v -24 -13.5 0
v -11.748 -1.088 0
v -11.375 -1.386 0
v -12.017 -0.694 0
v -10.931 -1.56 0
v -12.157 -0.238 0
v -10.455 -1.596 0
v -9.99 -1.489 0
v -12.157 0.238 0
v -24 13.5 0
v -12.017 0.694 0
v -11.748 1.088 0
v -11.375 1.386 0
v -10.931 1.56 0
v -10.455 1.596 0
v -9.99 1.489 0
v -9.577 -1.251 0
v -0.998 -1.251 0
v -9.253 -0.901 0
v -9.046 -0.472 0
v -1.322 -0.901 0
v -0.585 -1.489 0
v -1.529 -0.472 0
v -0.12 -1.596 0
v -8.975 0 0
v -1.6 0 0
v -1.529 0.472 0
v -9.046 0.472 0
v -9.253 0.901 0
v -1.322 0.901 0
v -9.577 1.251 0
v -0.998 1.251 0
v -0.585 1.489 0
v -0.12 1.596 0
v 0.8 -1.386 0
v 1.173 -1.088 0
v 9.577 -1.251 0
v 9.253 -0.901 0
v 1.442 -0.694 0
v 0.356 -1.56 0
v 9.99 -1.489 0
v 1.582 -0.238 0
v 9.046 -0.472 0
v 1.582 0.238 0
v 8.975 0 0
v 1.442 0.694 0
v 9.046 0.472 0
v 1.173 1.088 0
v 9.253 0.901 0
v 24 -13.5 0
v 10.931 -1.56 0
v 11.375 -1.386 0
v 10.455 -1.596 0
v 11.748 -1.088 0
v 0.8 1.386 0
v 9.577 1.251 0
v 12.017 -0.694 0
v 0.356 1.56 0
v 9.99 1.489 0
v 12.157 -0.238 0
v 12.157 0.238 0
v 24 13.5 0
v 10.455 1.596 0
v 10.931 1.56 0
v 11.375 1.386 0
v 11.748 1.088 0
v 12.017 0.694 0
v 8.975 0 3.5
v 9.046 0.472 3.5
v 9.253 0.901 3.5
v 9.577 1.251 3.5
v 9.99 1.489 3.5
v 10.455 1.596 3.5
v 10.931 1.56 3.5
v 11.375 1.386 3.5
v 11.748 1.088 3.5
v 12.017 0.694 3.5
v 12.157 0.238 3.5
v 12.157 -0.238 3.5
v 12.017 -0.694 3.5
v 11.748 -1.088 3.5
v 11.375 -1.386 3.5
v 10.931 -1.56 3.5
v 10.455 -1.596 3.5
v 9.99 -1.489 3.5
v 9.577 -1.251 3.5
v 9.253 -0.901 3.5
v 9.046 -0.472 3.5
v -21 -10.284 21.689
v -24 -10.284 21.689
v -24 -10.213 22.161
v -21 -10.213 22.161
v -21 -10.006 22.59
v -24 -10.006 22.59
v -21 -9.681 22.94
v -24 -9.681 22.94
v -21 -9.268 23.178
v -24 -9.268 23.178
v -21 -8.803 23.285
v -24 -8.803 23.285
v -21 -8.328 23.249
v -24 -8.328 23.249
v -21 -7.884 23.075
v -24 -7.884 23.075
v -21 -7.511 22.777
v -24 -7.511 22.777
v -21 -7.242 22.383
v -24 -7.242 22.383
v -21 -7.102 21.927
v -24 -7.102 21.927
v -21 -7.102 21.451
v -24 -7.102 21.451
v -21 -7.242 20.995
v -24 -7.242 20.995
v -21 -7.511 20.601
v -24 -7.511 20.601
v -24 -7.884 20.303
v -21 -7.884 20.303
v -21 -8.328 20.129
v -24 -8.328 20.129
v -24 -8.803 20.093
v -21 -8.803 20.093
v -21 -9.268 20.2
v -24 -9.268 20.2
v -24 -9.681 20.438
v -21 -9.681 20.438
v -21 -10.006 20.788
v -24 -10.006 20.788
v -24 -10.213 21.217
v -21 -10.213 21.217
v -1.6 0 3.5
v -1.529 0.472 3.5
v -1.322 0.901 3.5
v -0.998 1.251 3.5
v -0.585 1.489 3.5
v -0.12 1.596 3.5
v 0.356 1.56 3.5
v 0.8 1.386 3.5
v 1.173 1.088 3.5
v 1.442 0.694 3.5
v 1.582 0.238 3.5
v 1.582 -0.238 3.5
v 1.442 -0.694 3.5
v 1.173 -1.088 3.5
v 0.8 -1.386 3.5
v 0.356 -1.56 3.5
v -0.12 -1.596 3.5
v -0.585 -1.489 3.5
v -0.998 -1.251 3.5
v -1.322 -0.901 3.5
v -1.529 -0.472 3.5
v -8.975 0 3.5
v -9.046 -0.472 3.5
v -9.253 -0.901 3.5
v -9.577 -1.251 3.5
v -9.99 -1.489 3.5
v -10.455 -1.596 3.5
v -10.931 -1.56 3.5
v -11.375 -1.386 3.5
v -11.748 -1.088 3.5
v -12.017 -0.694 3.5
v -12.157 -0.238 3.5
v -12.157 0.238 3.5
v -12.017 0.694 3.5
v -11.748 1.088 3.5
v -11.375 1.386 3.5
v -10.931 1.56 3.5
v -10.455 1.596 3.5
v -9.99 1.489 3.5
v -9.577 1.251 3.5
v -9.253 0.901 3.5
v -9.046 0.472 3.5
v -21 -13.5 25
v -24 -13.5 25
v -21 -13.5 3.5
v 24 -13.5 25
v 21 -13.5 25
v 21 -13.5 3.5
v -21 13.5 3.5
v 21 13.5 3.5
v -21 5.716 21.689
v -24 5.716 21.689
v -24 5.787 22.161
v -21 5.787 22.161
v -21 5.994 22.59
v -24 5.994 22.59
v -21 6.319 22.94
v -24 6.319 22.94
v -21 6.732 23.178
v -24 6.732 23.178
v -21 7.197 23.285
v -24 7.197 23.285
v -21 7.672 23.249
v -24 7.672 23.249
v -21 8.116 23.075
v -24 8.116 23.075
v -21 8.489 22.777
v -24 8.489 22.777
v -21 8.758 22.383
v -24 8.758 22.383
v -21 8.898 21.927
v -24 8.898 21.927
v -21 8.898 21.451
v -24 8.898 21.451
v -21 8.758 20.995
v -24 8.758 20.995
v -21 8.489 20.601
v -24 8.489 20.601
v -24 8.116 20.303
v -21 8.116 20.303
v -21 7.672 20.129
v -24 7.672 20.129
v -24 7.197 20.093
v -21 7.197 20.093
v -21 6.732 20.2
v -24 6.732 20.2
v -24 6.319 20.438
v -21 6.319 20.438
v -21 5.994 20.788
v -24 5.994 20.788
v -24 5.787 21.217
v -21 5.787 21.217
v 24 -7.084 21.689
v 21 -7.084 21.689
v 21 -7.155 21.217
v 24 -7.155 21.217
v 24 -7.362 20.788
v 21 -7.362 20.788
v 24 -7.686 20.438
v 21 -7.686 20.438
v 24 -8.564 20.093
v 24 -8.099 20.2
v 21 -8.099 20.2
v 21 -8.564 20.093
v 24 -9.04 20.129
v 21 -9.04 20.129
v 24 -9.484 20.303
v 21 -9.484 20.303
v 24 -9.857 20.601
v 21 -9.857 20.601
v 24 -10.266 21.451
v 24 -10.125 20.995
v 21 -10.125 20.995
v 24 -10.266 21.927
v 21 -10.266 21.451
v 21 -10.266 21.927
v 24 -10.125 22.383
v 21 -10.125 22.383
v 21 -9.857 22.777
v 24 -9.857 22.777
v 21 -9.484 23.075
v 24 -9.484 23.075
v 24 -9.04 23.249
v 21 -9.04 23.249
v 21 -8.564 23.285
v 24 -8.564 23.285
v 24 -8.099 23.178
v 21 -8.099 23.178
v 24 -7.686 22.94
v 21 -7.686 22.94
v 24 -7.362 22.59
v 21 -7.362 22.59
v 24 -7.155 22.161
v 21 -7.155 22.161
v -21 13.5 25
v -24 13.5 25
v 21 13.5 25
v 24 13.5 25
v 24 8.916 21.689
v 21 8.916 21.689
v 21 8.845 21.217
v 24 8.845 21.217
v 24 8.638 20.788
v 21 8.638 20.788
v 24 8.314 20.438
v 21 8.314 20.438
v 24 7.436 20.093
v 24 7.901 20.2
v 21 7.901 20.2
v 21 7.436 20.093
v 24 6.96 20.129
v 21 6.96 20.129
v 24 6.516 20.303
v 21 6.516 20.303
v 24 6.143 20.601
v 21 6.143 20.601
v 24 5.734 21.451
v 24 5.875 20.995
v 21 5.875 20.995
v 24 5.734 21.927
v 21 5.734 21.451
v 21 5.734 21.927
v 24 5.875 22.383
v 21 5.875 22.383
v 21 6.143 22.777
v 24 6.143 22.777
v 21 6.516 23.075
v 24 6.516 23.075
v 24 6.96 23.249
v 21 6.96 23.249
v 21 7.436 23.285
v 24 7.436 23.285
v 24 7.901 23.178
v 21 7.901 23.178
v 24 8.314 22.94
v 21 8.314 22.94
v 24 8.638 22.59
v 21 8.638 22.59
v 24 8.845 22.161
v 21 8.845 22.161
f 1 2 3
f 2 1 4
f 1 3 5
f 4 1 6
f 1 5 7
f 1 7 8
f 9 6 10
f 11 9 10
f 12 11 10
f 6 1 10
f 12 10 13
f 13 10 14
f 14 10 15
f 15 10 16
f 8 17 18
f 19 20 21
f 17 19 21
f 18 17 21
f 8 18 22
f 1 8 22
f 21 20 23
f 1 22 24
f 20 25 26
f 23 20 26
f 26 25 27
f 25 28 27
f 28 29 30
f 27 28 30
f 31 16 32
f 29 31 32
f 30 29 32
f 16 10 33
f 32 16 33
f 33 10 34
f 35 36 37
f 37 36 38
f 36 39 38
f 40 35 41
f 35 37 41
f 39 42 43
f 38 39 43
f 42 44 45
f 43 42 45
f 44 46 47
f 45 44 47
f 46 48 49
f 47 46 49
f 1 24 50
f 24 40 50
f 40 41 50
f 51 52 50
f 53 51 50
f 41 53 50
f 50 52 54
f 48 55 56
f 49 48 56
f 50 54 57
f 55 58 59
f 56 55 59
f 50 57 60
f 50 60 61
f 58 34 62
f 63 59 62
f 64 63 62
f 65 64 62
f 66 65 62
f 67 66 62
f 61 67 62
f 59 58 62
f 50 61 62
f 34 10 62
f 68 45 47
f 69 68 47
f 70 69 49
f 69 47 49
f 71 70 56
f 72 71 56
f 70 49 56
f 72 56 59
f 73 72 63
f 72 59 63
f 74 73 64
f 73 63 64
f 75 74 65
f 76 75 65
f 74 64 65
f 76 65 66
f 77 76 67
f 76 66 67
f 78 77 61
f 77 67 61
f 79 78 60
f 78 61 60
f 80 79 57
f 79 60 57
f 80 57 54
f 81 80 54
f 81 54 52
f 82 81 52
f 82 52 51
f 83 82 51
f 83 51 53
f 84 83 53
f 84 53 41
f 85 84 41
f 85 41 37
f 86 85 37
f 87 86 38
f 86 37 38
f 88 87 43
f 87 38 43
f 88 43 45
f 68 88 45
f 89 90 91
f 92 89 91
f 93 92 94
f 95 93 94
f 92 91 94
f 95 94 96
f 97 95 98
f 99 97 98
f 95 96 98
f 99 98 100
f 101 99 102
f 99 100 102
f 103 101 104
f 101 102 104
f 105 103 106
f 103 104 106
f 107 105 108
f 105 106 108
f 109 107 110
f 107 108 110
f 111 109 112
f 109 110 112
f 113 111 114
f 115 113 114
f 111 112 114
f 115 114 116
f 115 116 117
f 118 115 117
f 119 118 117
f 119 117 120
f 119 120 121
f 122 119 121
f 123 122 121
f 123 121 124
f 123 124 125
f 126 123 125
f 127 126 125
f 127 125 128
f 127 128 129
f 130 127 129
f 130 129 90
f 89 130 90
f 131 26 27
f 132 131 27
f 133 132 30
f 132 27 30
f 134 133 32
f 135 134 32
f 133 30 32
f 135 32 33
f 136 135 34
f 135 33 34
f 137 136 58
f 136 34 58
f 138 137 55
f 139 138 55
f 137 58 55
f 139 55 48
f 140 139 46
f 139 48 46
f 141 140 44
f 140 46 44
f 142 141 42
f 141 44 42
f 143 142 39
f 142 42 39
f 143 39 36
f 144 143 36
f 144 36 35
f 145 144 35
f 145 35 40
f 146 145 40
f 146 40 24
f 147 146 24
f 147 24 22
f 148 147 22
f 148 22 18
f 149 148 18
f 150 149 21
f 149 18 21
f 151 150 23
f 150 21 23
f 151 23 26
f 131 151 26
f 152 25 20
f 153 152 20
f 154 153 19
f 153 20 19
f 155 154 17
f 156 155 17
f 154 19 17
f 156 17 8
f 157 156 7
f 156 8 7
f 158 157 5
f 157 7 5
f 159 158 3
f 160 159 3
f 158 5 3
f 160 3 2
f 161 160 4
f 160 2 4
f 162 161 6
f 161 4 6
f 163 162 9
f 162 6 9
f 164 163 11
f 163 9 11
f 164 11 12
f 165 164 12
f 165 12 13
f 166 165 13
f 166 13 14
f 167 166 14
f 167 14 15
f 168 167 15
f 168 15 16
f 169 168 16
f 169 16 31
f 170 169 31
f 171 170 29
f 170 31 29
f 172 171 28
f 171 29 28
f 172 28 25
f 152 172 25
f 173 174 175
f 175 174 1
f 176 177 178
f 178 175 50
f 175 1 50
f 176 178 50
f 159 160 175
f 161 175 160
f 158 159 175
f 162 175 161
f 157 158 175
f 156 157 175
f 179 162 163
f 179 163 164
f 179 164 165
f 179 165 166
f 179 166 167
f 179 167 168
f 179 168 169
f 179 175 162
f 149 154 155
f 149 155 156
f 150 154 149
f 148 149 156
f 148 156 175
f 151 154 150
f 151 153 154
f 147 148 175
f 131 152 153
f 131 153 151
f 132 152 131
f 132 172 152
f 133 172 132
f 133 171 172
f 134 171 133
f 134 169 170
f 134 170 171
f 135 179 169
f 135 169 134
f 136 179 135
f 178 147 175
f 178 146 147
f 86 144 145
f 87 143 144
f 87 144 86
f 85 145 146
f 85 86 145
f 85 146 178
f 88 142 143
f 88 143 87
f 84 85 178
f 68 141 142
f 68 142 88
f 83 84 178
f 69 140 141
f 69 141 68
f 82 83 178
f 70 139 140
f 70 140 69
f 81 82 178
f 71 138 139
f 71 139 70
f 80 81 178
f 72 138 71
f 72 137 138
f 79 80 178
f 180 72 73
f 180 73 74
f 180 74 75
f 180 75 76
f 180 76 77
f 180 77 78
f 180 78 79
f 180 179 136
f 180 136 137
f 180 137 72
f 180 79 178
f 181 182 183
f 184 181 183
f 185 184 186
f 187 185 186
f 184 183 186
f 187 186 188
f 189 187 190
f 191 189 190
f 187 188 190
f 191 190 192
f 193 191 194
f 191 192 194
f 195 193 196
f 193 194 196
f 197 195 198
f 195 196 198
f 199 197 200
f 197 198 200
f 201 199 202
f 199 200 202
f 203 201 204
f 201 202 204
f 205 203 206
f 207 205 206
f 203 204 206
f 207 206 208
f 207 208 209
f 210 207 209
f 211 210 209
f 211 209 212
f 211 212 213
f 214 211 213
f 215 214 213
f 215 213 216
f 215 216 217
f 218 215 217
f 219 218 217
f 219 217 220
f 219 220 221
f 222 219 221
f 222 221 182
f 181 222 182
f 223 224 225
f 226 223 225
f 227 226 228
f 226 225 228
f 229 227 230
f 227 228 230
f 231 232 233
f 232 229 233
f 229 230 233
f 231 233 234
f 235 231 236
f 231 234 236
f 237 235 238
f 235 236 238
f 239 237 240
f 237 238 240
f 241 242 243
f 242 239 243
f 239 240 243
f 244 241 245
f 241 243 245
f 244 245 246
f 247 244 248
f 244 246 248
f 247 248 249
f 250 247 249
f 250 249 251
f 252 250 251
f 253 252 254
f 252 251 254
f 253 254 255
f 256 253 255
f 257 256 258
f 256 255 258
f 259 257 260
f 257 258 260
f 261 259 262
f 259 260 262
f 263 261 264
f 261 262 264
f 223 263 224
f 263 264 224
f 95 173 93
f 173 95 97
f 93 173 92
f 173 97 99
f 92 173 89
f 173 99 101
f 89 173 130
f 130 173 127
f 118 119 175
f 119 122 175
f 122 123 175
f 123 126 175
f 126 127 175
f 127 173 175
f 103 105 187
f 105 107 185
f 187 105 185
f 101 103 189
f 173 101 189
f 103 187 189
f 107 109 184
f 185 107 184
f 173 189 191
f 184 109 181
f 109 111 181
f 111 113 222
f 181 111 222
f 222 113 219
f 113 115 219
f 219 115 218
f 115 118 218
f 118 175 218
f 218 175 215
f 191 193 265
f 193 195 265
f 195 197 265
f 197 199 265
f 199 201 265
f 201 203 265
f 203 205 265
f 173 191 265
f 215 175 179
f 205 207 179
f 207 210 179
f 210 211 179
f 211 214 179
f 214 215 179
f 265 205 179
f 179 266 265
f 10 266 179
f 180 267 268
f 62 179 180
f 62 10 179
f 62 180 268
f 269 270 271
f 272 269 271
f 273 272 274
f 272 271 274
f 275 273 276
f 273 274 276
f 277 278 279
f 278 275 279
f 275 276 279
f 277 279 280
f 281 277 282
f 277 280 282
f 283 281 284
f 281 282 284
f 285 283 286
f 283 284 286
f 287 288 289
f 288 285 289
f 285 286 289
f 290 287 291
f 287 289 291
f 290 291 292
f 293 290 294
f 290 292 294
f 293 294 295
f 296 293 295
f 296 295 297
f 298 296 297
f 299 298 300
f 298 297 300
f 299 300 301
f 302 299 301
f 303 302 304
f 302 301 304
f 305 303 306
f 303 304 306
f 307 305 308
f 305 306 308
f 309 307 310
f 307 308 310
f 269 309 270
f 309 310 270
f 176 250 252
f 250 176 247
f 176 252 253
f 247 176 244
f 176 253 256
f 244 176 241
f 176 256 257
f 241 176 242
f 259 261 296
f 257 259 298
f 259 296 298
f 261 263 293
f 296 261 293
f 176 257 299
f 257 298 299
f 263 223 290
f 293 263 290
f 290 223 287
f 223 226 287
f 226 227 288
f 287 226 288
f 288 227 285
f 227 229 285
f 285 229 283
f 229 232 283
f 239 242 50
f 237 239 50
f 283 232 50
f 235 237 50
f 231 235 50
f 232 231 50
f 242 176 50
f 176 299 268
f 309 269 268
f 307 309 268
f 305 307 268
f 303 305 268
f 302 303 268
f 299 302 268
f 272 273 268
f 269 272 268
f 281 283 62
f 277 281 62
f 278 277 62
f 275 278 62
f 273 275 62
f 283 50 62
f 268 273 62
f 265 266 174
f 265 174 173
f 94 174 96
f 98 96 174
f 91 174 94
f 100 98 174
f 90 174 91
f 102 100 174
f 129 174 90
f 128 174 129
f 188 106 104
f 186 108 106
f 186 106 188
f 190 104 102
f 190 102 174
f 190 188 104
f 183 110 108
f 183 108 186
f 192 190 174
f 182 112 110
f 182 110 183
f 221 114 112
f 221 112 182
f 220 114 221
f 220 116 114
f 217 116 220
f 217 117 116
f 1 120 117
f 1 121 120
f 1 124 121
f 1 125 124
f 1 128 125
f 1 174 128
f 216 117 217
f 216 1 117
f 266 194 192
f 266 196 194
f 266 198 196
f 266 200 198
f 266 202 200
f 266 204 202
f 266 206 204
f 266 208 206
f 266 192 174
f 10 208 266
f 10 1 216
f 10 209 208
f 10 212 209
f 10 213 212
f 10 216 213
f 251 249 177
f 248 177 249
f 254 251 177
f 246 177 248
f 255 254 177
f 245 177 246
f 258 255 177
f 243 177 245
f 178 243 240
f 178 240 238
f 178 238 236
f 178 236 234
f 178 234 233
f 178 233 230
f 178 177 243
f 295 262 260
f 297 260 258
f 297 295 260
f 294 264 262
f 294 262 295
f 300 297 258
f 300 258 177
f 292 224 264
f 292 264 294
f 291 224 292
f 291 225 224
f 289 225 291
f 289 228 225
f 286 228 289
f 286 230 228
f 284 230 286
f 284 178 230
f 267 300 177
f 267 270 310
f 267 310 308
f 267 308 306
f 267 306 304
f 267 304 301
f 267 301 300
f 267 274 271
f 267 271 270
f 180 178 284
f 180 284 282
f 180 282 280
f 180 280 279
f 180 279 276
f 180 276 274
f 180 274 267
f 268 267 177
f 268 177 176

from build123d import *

# Parameters (mm, degrees)
F0_W     = 42
F0_H     = 27
F2_DEPTH = 3.5
F0_W_2   = 3
F3_DEPTH = 25
F4_DEPTH = 25
F5_D     = 3.2
F5_DEPTH = 24.001
F6_D     = 3.2
F6_DEPTH = 24.001
F7_D     = 3.2


with BuildPart() as f2:
    # F0 (on Top) → F2 (new body)
    with BuildSketch(Plane.XY):
        Rectangle(F0_W, F0_H)
        with BuildLine():
            ThreePointArc((-12.175, 0), (-10.575, 1.6), (-8.975, 0))
            ThreePointArc((-8.975, 0), (-10.575, -1.6), (-12.175, 0))
        make_face(mode=Mode.SUBTRACT)
        with BuildLine():
            ThreePointArc((1.6, 0), (0, -1.6), (-1.6, 0))
            ThreePointArc((-1.6, 0), (0, 1.6), (1.6, 0))
        make_face(mode=Mode.SUBTRACT)
        with BuildLine():
            ThreePointArc((12.175, 0), (10.575, -1.6), (8.975, 0))
            ThreePointArc((8.975, 0), (10.575, 1.6), (12.175, 0))
        make_face(mode=Mode.SUBTRACT)
    extrude(amount=F2_DEPTH)

    # F0 (on Top) → F3 (join)
    with BuildSketch(Plane.XY):
        with Locations((-22.5, 0)):
            Rectangle(F0_W_2, F0_H)
    extrude(amount=F3_DEPTH)

    # F0 (on Top) → F4 (join)
    with BuildSketch(Plane.XY):
        with Locations((22.5, 0)):
            Rectangle(F0_W_2, F0_H)
    extrude(amount=F4_DEPTH)

    # F5 (through all, one way)
    with BuildSketch(Plane(origin=(0, 0, 0), x_dir=(0, 1, 0), z_dir=(-1, 0, 0))):
        with Locations((-8.6837460197, -21.689)):
            Circle(F5_D / 2)
    extrude(amount=-F5_DEPTH, mode=Mode.SUBTRACT)

    # F6 (through all, one way)
    with BuildSketch(Plane(origin=(0, 0, 0), x_dir=(0, 1, 0), z_dir=(-1, 0, 0))):
        with Locations((7.3162539803, -21.689)):
            Circle(F6_D / 2)
    extrude(amount=-F6_DEPTH, mode=Mode.SUBTRACT)

    # F7 (through all)
    with Locations(Plane.YZ):
        with Locations((-8.6837460197, 21.689), (7.3162539803, 21.689)):
            Hole(F7_D / 2)


solid = f2.part
